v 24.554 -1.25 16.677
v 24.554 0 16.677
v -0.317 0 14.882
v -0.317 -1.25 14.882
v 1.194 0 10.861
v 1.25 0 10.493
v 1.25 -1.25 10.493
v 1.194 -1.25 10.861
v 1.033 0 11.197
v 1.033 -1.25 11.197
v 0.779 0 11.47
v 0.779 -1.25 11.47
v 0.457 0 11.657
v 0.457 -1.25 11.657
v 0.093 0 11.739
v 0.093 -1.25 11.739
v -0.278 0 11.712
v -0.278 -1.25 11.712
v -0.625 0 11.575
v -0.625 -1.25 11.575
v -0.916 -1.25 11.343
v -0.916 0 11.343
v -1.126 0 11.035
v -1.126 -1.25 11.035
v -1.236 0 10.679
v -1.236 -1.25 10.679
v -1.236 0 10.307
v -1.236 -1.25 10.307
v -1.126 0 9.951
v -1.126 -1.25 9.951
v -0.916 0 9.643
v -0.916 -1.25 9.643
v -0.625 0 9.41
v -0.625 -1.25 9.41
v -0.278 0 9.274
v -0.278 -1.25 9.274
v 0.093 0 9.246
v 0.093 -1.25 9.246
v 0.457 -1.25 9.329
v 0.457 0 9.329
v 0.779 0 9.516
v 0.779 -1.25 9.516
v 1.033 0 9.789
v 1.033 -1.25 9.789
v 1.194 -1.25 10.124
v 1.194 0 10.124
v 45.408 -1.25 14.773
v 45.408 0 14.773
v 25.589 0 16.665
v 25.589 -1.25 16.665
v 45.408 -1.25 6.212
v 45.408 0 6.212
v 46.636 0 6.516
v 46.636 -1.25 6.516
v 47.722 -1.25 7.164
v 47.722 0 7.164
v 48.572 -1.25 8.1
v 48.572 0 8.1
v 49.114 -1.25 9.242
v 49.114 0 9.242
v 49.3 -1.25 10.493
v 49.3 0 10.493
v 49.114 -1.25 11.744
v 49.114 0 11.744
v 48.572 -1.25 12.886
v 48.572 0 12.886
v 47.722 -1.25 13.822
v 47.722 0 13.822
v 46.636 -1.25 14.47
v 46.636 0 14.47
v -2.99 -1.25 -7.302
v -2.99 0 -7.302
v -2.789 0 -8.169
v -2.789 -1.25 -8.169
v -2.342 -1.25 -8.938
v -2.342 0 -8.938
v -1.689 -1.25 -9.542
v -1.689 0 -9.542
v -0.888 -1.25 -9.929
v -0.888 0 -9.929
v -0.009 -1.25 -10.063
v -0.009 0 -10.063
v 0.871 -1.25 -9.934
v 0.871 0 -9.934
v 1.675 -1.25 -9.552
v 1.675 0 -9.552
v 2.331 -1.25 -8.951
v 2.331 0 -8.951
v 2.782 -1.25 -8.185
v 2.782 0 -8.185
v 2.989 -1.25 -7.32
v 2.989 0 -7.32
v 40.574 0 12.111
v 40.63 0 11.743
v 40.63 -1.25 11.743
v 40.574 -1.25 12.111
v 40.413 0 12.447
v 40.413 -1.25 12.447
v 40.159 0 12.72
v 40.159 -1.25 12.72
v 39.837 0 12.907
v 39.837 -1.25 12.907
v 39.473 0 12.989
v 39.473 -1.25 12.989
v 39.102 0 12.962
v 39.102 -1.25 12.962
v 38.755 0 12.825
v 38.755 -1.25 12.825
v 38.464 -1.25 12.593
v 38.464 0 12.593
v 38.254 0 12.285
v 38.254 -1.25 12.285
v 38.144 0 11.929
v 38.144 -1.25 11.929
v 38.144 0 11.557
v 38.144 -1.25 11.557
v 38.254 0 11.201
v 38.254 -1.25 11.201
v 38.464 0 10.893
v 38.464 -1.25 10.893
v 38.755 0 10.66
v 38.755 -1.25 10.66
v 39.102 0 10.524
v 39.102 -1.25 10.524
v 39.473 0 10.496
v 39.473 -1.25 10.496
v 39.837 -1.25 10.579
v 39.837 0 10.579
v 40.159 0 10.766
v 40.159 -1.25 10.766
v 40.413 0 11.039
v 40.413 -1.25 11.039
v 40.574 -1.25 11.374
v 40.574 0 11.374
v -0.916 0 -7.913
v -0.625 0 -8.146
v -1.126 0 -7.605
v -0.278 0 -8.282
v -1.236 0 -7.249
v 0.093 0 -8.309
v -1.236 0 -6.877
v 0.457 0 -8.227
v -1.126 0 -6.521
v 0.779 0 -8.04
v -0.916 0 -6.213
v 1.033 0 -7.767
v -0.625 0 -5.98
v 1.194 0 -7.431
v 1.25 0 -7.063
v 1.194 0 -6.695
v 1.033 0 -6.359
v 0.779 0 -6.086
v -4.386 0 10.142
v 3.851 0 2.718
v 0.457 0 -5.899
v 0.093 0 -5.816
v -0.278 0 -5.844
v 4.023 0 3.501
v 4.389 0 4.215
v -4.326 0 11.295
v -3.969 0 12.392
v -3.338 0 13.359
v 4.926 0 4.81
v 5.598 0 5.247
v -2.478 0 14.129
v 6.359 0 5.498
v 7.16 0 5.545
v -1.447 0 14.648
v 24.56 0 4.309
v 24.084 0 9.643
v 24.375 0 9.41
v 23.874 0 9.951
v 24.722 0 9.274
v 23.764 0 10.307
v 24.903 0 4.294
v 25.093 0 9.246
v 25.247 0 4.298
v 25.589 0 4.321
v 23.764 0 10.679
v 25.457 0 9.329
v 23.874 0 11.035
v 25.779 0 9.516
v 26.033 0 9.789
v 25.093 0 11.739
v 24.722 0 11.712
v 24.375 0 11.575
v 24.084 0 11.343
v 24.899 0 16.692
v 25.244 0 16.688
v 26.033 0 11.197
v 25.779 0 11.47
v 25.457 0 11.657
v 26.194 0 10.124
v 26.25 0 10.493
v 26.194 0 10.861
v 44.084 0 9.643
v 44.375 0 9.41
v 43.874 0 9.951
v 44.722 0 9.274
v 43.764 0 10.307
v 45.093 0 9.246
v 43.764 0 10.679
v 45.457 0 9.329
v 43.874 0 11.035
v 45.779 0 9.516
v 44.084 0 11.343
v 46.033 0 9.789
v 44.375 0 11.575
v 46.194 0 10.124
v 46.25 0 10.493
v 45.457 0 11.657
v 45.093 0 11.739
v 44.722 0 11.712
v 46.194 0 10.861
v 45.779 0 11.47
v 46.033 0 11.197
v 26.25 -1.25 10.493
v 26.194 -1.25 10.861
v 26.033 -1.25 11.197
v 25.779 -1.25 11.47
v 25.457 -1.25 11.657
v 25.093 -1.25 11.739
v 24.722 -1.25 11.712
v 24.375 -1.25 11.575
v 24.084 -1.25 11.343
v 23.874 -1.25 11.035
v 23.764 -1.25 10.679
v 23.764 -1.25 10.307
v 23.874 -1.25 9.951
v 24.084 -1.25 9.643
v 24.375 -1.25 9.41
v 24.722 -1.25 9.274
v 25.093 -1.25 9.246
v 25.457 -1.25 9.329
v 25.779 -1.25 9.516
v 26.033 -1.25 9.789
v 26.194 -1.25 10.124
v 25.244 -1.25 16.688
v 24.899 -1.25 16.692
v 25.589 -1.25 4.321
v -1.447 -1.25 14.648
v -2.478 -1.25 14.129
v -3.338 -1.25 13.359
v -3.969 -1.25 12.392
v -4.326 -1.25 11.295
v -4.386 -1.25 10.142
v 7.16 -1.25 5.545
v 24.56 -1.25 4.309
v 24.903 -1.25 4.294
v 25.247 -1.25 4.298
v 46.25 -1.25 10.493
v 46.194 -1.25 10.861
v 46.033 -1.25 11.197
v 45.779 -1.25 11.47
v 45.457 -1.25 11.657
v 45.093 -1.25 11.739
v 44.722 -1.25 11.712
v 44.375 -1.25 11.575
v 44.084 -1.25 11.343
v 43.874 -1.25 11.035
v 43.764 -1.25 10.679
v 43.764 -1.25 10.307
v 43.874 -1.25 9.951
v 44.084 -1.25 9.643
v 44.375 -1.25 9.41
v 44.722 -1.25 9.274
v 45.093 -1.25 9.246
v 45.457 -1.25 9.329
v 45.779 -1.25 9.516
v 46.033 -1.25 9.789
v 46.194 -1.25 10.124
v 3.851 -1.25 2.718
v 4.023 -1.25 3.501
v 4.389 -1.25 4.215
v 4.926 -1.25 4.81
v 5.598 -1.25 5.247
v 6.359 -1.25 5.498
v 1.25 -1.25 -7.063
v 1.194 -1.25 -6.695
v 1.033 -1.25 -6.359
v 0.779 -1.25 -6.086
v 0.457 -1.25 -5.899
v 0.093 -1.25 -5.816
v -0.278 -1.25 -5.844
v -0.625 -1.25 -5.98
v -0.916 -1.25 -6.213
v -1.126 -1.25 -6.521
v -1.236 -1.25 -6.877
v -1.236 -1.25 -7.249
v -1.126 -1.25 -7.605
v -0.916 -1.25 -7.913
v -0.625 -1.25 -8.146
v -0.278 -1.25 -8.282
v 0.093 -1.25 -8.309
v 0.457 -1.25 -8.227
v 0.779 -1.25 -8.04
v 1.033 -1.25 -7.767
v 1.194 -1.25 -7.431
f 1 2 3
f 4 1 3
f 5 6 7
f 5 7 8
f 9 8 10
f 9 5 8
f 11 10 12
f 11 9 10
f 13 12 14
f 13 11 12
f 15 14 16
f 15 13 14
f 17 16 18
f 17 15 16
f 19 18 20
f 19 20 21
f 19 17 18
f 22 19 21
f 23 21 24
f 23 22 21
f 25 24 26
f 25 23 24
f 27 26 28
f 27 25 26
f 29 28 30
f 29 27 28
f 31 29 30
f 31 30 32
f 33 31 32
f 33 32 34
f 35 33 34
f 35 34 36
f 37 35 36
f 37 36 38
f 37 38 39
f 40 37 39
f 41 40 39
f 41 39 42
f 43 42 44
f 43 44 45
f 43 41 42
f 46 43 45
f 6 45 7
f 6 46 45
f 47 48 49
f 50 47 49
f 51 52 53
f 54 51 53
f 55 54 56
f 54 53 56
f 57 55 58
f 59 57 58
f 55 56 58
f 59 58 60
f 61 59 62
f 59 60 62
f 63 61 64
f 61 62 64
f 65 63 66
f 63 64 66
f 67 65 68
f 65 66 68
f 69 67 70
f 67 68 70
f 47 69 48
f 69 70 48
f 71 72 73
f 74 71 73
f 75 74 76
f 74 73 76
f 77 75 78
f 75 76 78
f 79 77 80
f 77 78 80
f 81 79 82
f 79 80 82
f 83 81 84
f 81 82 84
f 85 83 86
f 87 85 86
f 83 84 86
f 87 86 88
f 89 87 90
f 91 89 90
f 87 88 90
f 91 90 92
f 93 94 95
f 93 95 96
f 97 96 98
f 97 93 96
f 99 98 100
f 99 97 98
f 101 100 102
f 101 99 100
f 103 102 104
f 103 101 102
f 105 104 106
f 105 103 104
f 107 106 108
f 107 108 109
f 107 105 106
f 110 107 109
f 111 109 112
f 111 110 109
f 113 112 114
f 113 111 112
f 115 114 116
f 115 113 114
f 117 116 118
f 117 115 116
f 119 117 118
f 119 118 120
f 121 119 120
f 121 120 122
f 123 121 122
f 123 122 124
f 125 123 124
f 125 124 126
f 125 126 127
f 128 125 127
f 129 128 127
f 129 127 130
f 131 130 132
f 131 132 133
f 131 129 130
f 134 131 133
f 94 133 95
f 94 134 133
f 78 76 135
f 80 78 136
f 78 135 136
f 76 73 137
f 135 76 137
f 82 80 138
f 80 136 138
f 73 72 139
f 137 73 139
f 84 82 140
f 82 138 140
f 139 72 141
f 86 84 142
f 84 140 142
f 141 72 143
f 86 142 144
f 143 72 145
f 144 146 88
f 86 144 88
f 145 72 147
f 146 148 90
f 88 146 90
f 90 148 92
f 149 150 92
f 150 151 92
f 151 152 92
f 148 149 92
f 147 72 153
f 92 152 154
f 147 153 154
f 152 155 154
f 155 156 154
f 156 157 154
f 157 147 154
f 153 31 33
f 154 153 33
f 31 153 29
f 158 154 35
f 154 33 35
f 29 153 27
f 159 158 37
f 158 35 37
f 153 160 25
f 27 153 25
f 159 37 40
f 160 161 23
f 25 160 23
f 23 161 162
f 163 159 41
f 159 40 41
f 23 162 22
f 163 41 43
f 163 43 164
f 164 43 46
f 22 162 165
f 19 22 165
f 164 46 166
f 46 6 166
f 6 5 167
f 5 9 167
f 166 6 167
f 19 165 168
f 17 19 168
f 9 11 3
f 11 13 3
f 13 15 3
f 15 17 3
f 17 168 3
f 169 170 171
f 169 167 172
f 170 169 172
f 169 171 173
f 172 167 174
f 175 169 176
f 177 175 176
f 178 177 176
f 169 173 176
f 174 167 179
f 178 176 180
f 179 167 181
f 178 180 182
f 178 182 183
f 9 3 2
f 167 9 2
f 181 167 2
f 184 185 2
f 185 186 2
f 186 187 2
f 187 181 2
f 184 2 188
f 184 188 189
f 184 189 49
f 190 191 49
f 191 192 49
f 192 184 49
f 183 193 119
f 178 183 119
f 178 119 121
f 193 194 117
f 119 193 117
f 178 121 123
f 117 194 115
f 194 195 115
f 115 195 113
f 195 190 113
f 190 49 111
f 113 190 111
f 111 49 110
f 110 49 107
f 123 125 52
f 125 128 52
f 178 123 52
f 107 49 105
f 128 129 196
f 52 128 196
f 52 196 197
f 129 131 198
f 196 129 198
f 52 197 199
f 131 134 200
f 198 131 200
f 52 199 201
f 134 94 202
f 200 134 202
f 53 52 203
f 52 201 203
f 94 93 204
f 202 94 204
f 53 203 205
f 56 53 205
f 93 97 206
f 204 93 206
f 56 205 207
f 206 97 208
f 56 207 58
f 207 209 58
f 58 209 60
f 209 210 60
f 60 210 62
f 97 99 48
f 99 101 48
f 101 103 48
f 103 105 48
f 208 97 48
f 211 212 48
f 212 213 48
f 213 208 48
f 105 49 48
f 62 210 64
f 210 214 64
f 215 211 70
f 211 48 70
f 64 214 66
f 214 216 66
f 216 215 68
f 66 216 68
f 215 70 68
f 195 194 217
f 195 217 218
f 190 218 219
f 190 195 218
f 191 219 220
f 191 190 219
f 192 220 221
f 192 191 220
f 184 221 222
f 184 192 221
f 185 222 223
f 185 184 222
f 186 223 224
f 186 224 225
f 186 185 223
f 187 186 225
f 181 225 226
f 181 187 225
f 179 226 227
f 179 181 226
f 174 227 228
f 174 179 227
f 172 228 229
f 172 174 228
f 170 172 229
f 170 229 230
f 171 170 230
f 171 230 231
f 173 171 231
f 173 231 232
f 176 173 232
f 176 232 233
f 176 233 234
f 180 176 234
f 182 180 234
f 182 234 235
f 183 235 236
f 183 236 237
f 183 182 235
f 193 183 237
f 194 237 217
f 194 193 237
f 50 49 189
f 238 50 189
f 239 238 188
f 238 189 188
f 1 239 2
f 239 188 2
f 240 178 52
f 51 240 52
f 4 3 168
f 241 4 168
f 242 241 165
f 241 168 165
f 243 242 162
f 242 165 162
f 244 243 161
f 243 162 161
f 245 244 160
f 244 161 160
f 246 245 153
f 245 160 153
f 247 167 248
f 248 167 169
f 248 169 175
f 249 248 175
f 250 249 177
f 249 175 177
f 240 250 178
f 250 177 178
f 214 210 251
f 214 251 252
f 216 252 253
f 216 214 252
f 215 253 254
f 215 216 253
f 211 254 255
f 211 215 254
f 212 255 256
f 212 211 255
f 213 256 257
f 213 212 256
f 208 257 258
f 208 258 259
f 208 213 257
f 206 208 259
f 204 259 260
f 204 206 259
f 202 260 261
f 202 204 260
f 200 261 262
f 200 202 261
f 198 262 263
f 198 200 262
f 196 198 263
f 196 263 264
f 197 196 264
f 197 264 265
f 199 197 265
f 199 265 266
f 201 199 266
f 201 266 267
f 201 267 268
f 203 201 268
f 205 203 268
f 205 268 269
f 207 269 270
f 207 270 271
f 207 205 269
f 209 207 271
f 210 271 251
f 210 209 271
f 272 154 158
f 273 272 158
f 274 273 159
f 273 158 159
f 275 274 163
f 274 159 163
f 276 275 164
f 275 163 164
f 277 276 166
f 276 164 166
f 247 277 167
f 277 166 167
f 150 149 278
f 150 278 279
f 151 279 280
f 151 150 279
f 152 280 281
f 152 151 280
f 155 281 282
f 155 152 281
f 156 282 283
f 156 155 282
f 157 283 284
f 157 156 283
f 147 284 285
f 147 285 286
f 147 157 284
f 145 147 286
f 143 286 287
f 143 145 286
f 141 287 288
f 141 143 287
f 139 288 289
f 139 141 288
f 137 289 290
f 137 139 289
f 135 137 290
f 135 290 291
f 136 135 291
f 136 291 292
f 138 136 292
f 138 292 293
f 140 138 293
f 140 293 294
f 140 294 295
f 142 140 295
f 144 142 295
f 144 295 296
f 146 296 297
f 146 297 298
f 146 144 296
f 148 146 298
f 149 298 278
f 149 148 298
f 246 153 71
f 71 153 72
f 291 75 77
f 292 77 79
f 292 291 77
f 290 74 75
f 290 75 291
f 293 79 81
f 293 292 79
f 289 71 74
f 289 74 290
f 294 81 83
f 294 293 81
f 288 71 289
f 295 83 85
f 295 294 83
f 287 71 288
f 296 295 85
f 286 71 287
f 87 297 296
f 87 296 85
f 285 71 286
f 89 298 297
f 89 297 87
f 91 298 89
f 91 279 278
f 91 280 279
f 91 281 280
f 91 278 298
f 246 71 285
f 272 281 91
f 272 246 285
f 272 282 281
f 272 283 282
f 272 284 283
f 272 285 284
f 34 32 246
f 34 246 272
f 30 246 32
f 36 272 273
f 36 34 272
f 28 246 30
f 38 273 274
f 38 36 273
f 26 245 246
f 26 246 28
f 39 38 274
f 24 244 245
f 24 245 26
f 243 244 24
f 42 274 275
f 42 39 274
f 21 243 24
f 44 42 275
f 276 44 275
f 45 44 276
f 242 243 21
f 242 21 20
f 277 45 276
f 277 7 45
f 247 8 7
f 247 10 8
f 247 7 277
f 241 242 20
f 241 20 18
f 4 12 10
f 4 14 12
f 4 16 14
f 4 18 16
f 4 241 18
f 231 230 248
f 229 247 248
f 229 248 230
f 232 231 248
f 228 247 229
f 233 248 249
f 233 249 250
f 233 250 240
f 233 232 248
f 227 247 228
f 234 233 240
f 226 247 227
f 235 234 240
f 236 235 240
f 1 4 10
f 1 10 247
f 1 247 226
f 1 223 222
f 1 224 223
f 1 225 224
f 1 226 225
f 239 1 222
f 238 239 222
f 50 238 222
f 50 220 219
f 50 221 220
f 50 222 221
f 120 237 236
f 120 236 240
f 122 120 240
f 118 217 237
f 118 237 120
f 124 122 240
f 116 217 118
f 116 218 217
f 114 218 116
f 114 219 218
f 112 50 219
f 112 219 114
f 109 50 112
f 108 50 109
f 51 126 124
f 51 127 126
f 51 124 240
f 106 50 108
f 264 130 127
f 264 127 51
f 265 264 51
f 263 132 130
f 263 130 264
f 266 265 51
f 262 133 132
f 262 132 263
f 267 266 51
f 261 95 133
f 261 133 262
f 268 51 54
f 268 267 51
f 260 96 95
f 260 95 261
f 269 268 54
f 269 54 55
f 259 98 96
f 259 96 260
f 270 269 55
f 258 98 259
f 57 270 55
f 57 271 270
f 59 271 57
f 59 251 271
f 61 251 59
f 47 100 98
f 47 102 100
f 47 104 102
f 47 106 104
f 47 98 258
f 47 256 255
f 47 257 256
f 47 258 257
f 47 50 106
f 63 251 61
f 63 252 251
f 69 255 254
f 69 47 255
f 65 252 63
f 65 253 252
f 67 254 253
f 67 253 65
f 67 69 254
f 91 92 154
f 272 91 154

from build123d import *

# Parameters (mm, degrees)
F0_R     = 1.25
F1_DEPTH = 1.25


with BuildPart() as f1:
    # F0 (on Front) → F1 (new body)
    with BuildSketch(Plane.XZ):
        with BuildLine():
            Line((24.5536, 16.676832), (-0.3168, 14.881504))
            ThreePointArc((-0.3168, 14.881504), (-3.338363, 13.359163), (-4.385987, 10.142044))
            Line((-4.385987, 10.142044), (-2.990446, -7.302223))
            ThreePointArc((-2.990446, -7.302223), (-0.008807, -10.062975), (2.98899, -7.319777))
            Line((2.98899, -7.319777), (3.851377, 2.718273))
            ThreePointArc((3.851377, 2.718273), (4.926203, 4.809747), (7.159751, 5.545125))
            Line((7.159751, 5.545125), (24.560498, 4.30852))
            ThreePointArc((24.560498, 4.30852), (25.075008, 4.293377), (25.589, 4.320964))
            Line((25.589, 4.320964), (45.4085, 6.212371))
            ThreePointArc((45.4085, 6.212371), (49.3, 10.492923), (45.4085, 14.773475))
            Line((45.4085, 14.773475), (25.589, 16.664882))
            ThreePointArc((25.589, 16.664882), (25.07155, 16.69251), (24.5536, 16.676832))
        make_face()
        with Locations((0, -7.062988)):
            Circle(F0_R, mode=Mode.SUBTRACT)
        with Locations((0, 10.492923)):
            Circle(F0_R, mode=Mode.SUBTRACT)
        with Locations((25, 10.492923)):
            Circle(F0_R, mode=Mode.SUBTRACT)
        with Locations((39.38, 11.742923)):
            Circle(F0_R, mode=Mode.SUBTRACT)
        with Locations((45, 10.492923)):
            Circle(F0_R, mode=Mode.SUBTRACT)
    extrude(amount=F1_DEPTH)


solid = f1.part
